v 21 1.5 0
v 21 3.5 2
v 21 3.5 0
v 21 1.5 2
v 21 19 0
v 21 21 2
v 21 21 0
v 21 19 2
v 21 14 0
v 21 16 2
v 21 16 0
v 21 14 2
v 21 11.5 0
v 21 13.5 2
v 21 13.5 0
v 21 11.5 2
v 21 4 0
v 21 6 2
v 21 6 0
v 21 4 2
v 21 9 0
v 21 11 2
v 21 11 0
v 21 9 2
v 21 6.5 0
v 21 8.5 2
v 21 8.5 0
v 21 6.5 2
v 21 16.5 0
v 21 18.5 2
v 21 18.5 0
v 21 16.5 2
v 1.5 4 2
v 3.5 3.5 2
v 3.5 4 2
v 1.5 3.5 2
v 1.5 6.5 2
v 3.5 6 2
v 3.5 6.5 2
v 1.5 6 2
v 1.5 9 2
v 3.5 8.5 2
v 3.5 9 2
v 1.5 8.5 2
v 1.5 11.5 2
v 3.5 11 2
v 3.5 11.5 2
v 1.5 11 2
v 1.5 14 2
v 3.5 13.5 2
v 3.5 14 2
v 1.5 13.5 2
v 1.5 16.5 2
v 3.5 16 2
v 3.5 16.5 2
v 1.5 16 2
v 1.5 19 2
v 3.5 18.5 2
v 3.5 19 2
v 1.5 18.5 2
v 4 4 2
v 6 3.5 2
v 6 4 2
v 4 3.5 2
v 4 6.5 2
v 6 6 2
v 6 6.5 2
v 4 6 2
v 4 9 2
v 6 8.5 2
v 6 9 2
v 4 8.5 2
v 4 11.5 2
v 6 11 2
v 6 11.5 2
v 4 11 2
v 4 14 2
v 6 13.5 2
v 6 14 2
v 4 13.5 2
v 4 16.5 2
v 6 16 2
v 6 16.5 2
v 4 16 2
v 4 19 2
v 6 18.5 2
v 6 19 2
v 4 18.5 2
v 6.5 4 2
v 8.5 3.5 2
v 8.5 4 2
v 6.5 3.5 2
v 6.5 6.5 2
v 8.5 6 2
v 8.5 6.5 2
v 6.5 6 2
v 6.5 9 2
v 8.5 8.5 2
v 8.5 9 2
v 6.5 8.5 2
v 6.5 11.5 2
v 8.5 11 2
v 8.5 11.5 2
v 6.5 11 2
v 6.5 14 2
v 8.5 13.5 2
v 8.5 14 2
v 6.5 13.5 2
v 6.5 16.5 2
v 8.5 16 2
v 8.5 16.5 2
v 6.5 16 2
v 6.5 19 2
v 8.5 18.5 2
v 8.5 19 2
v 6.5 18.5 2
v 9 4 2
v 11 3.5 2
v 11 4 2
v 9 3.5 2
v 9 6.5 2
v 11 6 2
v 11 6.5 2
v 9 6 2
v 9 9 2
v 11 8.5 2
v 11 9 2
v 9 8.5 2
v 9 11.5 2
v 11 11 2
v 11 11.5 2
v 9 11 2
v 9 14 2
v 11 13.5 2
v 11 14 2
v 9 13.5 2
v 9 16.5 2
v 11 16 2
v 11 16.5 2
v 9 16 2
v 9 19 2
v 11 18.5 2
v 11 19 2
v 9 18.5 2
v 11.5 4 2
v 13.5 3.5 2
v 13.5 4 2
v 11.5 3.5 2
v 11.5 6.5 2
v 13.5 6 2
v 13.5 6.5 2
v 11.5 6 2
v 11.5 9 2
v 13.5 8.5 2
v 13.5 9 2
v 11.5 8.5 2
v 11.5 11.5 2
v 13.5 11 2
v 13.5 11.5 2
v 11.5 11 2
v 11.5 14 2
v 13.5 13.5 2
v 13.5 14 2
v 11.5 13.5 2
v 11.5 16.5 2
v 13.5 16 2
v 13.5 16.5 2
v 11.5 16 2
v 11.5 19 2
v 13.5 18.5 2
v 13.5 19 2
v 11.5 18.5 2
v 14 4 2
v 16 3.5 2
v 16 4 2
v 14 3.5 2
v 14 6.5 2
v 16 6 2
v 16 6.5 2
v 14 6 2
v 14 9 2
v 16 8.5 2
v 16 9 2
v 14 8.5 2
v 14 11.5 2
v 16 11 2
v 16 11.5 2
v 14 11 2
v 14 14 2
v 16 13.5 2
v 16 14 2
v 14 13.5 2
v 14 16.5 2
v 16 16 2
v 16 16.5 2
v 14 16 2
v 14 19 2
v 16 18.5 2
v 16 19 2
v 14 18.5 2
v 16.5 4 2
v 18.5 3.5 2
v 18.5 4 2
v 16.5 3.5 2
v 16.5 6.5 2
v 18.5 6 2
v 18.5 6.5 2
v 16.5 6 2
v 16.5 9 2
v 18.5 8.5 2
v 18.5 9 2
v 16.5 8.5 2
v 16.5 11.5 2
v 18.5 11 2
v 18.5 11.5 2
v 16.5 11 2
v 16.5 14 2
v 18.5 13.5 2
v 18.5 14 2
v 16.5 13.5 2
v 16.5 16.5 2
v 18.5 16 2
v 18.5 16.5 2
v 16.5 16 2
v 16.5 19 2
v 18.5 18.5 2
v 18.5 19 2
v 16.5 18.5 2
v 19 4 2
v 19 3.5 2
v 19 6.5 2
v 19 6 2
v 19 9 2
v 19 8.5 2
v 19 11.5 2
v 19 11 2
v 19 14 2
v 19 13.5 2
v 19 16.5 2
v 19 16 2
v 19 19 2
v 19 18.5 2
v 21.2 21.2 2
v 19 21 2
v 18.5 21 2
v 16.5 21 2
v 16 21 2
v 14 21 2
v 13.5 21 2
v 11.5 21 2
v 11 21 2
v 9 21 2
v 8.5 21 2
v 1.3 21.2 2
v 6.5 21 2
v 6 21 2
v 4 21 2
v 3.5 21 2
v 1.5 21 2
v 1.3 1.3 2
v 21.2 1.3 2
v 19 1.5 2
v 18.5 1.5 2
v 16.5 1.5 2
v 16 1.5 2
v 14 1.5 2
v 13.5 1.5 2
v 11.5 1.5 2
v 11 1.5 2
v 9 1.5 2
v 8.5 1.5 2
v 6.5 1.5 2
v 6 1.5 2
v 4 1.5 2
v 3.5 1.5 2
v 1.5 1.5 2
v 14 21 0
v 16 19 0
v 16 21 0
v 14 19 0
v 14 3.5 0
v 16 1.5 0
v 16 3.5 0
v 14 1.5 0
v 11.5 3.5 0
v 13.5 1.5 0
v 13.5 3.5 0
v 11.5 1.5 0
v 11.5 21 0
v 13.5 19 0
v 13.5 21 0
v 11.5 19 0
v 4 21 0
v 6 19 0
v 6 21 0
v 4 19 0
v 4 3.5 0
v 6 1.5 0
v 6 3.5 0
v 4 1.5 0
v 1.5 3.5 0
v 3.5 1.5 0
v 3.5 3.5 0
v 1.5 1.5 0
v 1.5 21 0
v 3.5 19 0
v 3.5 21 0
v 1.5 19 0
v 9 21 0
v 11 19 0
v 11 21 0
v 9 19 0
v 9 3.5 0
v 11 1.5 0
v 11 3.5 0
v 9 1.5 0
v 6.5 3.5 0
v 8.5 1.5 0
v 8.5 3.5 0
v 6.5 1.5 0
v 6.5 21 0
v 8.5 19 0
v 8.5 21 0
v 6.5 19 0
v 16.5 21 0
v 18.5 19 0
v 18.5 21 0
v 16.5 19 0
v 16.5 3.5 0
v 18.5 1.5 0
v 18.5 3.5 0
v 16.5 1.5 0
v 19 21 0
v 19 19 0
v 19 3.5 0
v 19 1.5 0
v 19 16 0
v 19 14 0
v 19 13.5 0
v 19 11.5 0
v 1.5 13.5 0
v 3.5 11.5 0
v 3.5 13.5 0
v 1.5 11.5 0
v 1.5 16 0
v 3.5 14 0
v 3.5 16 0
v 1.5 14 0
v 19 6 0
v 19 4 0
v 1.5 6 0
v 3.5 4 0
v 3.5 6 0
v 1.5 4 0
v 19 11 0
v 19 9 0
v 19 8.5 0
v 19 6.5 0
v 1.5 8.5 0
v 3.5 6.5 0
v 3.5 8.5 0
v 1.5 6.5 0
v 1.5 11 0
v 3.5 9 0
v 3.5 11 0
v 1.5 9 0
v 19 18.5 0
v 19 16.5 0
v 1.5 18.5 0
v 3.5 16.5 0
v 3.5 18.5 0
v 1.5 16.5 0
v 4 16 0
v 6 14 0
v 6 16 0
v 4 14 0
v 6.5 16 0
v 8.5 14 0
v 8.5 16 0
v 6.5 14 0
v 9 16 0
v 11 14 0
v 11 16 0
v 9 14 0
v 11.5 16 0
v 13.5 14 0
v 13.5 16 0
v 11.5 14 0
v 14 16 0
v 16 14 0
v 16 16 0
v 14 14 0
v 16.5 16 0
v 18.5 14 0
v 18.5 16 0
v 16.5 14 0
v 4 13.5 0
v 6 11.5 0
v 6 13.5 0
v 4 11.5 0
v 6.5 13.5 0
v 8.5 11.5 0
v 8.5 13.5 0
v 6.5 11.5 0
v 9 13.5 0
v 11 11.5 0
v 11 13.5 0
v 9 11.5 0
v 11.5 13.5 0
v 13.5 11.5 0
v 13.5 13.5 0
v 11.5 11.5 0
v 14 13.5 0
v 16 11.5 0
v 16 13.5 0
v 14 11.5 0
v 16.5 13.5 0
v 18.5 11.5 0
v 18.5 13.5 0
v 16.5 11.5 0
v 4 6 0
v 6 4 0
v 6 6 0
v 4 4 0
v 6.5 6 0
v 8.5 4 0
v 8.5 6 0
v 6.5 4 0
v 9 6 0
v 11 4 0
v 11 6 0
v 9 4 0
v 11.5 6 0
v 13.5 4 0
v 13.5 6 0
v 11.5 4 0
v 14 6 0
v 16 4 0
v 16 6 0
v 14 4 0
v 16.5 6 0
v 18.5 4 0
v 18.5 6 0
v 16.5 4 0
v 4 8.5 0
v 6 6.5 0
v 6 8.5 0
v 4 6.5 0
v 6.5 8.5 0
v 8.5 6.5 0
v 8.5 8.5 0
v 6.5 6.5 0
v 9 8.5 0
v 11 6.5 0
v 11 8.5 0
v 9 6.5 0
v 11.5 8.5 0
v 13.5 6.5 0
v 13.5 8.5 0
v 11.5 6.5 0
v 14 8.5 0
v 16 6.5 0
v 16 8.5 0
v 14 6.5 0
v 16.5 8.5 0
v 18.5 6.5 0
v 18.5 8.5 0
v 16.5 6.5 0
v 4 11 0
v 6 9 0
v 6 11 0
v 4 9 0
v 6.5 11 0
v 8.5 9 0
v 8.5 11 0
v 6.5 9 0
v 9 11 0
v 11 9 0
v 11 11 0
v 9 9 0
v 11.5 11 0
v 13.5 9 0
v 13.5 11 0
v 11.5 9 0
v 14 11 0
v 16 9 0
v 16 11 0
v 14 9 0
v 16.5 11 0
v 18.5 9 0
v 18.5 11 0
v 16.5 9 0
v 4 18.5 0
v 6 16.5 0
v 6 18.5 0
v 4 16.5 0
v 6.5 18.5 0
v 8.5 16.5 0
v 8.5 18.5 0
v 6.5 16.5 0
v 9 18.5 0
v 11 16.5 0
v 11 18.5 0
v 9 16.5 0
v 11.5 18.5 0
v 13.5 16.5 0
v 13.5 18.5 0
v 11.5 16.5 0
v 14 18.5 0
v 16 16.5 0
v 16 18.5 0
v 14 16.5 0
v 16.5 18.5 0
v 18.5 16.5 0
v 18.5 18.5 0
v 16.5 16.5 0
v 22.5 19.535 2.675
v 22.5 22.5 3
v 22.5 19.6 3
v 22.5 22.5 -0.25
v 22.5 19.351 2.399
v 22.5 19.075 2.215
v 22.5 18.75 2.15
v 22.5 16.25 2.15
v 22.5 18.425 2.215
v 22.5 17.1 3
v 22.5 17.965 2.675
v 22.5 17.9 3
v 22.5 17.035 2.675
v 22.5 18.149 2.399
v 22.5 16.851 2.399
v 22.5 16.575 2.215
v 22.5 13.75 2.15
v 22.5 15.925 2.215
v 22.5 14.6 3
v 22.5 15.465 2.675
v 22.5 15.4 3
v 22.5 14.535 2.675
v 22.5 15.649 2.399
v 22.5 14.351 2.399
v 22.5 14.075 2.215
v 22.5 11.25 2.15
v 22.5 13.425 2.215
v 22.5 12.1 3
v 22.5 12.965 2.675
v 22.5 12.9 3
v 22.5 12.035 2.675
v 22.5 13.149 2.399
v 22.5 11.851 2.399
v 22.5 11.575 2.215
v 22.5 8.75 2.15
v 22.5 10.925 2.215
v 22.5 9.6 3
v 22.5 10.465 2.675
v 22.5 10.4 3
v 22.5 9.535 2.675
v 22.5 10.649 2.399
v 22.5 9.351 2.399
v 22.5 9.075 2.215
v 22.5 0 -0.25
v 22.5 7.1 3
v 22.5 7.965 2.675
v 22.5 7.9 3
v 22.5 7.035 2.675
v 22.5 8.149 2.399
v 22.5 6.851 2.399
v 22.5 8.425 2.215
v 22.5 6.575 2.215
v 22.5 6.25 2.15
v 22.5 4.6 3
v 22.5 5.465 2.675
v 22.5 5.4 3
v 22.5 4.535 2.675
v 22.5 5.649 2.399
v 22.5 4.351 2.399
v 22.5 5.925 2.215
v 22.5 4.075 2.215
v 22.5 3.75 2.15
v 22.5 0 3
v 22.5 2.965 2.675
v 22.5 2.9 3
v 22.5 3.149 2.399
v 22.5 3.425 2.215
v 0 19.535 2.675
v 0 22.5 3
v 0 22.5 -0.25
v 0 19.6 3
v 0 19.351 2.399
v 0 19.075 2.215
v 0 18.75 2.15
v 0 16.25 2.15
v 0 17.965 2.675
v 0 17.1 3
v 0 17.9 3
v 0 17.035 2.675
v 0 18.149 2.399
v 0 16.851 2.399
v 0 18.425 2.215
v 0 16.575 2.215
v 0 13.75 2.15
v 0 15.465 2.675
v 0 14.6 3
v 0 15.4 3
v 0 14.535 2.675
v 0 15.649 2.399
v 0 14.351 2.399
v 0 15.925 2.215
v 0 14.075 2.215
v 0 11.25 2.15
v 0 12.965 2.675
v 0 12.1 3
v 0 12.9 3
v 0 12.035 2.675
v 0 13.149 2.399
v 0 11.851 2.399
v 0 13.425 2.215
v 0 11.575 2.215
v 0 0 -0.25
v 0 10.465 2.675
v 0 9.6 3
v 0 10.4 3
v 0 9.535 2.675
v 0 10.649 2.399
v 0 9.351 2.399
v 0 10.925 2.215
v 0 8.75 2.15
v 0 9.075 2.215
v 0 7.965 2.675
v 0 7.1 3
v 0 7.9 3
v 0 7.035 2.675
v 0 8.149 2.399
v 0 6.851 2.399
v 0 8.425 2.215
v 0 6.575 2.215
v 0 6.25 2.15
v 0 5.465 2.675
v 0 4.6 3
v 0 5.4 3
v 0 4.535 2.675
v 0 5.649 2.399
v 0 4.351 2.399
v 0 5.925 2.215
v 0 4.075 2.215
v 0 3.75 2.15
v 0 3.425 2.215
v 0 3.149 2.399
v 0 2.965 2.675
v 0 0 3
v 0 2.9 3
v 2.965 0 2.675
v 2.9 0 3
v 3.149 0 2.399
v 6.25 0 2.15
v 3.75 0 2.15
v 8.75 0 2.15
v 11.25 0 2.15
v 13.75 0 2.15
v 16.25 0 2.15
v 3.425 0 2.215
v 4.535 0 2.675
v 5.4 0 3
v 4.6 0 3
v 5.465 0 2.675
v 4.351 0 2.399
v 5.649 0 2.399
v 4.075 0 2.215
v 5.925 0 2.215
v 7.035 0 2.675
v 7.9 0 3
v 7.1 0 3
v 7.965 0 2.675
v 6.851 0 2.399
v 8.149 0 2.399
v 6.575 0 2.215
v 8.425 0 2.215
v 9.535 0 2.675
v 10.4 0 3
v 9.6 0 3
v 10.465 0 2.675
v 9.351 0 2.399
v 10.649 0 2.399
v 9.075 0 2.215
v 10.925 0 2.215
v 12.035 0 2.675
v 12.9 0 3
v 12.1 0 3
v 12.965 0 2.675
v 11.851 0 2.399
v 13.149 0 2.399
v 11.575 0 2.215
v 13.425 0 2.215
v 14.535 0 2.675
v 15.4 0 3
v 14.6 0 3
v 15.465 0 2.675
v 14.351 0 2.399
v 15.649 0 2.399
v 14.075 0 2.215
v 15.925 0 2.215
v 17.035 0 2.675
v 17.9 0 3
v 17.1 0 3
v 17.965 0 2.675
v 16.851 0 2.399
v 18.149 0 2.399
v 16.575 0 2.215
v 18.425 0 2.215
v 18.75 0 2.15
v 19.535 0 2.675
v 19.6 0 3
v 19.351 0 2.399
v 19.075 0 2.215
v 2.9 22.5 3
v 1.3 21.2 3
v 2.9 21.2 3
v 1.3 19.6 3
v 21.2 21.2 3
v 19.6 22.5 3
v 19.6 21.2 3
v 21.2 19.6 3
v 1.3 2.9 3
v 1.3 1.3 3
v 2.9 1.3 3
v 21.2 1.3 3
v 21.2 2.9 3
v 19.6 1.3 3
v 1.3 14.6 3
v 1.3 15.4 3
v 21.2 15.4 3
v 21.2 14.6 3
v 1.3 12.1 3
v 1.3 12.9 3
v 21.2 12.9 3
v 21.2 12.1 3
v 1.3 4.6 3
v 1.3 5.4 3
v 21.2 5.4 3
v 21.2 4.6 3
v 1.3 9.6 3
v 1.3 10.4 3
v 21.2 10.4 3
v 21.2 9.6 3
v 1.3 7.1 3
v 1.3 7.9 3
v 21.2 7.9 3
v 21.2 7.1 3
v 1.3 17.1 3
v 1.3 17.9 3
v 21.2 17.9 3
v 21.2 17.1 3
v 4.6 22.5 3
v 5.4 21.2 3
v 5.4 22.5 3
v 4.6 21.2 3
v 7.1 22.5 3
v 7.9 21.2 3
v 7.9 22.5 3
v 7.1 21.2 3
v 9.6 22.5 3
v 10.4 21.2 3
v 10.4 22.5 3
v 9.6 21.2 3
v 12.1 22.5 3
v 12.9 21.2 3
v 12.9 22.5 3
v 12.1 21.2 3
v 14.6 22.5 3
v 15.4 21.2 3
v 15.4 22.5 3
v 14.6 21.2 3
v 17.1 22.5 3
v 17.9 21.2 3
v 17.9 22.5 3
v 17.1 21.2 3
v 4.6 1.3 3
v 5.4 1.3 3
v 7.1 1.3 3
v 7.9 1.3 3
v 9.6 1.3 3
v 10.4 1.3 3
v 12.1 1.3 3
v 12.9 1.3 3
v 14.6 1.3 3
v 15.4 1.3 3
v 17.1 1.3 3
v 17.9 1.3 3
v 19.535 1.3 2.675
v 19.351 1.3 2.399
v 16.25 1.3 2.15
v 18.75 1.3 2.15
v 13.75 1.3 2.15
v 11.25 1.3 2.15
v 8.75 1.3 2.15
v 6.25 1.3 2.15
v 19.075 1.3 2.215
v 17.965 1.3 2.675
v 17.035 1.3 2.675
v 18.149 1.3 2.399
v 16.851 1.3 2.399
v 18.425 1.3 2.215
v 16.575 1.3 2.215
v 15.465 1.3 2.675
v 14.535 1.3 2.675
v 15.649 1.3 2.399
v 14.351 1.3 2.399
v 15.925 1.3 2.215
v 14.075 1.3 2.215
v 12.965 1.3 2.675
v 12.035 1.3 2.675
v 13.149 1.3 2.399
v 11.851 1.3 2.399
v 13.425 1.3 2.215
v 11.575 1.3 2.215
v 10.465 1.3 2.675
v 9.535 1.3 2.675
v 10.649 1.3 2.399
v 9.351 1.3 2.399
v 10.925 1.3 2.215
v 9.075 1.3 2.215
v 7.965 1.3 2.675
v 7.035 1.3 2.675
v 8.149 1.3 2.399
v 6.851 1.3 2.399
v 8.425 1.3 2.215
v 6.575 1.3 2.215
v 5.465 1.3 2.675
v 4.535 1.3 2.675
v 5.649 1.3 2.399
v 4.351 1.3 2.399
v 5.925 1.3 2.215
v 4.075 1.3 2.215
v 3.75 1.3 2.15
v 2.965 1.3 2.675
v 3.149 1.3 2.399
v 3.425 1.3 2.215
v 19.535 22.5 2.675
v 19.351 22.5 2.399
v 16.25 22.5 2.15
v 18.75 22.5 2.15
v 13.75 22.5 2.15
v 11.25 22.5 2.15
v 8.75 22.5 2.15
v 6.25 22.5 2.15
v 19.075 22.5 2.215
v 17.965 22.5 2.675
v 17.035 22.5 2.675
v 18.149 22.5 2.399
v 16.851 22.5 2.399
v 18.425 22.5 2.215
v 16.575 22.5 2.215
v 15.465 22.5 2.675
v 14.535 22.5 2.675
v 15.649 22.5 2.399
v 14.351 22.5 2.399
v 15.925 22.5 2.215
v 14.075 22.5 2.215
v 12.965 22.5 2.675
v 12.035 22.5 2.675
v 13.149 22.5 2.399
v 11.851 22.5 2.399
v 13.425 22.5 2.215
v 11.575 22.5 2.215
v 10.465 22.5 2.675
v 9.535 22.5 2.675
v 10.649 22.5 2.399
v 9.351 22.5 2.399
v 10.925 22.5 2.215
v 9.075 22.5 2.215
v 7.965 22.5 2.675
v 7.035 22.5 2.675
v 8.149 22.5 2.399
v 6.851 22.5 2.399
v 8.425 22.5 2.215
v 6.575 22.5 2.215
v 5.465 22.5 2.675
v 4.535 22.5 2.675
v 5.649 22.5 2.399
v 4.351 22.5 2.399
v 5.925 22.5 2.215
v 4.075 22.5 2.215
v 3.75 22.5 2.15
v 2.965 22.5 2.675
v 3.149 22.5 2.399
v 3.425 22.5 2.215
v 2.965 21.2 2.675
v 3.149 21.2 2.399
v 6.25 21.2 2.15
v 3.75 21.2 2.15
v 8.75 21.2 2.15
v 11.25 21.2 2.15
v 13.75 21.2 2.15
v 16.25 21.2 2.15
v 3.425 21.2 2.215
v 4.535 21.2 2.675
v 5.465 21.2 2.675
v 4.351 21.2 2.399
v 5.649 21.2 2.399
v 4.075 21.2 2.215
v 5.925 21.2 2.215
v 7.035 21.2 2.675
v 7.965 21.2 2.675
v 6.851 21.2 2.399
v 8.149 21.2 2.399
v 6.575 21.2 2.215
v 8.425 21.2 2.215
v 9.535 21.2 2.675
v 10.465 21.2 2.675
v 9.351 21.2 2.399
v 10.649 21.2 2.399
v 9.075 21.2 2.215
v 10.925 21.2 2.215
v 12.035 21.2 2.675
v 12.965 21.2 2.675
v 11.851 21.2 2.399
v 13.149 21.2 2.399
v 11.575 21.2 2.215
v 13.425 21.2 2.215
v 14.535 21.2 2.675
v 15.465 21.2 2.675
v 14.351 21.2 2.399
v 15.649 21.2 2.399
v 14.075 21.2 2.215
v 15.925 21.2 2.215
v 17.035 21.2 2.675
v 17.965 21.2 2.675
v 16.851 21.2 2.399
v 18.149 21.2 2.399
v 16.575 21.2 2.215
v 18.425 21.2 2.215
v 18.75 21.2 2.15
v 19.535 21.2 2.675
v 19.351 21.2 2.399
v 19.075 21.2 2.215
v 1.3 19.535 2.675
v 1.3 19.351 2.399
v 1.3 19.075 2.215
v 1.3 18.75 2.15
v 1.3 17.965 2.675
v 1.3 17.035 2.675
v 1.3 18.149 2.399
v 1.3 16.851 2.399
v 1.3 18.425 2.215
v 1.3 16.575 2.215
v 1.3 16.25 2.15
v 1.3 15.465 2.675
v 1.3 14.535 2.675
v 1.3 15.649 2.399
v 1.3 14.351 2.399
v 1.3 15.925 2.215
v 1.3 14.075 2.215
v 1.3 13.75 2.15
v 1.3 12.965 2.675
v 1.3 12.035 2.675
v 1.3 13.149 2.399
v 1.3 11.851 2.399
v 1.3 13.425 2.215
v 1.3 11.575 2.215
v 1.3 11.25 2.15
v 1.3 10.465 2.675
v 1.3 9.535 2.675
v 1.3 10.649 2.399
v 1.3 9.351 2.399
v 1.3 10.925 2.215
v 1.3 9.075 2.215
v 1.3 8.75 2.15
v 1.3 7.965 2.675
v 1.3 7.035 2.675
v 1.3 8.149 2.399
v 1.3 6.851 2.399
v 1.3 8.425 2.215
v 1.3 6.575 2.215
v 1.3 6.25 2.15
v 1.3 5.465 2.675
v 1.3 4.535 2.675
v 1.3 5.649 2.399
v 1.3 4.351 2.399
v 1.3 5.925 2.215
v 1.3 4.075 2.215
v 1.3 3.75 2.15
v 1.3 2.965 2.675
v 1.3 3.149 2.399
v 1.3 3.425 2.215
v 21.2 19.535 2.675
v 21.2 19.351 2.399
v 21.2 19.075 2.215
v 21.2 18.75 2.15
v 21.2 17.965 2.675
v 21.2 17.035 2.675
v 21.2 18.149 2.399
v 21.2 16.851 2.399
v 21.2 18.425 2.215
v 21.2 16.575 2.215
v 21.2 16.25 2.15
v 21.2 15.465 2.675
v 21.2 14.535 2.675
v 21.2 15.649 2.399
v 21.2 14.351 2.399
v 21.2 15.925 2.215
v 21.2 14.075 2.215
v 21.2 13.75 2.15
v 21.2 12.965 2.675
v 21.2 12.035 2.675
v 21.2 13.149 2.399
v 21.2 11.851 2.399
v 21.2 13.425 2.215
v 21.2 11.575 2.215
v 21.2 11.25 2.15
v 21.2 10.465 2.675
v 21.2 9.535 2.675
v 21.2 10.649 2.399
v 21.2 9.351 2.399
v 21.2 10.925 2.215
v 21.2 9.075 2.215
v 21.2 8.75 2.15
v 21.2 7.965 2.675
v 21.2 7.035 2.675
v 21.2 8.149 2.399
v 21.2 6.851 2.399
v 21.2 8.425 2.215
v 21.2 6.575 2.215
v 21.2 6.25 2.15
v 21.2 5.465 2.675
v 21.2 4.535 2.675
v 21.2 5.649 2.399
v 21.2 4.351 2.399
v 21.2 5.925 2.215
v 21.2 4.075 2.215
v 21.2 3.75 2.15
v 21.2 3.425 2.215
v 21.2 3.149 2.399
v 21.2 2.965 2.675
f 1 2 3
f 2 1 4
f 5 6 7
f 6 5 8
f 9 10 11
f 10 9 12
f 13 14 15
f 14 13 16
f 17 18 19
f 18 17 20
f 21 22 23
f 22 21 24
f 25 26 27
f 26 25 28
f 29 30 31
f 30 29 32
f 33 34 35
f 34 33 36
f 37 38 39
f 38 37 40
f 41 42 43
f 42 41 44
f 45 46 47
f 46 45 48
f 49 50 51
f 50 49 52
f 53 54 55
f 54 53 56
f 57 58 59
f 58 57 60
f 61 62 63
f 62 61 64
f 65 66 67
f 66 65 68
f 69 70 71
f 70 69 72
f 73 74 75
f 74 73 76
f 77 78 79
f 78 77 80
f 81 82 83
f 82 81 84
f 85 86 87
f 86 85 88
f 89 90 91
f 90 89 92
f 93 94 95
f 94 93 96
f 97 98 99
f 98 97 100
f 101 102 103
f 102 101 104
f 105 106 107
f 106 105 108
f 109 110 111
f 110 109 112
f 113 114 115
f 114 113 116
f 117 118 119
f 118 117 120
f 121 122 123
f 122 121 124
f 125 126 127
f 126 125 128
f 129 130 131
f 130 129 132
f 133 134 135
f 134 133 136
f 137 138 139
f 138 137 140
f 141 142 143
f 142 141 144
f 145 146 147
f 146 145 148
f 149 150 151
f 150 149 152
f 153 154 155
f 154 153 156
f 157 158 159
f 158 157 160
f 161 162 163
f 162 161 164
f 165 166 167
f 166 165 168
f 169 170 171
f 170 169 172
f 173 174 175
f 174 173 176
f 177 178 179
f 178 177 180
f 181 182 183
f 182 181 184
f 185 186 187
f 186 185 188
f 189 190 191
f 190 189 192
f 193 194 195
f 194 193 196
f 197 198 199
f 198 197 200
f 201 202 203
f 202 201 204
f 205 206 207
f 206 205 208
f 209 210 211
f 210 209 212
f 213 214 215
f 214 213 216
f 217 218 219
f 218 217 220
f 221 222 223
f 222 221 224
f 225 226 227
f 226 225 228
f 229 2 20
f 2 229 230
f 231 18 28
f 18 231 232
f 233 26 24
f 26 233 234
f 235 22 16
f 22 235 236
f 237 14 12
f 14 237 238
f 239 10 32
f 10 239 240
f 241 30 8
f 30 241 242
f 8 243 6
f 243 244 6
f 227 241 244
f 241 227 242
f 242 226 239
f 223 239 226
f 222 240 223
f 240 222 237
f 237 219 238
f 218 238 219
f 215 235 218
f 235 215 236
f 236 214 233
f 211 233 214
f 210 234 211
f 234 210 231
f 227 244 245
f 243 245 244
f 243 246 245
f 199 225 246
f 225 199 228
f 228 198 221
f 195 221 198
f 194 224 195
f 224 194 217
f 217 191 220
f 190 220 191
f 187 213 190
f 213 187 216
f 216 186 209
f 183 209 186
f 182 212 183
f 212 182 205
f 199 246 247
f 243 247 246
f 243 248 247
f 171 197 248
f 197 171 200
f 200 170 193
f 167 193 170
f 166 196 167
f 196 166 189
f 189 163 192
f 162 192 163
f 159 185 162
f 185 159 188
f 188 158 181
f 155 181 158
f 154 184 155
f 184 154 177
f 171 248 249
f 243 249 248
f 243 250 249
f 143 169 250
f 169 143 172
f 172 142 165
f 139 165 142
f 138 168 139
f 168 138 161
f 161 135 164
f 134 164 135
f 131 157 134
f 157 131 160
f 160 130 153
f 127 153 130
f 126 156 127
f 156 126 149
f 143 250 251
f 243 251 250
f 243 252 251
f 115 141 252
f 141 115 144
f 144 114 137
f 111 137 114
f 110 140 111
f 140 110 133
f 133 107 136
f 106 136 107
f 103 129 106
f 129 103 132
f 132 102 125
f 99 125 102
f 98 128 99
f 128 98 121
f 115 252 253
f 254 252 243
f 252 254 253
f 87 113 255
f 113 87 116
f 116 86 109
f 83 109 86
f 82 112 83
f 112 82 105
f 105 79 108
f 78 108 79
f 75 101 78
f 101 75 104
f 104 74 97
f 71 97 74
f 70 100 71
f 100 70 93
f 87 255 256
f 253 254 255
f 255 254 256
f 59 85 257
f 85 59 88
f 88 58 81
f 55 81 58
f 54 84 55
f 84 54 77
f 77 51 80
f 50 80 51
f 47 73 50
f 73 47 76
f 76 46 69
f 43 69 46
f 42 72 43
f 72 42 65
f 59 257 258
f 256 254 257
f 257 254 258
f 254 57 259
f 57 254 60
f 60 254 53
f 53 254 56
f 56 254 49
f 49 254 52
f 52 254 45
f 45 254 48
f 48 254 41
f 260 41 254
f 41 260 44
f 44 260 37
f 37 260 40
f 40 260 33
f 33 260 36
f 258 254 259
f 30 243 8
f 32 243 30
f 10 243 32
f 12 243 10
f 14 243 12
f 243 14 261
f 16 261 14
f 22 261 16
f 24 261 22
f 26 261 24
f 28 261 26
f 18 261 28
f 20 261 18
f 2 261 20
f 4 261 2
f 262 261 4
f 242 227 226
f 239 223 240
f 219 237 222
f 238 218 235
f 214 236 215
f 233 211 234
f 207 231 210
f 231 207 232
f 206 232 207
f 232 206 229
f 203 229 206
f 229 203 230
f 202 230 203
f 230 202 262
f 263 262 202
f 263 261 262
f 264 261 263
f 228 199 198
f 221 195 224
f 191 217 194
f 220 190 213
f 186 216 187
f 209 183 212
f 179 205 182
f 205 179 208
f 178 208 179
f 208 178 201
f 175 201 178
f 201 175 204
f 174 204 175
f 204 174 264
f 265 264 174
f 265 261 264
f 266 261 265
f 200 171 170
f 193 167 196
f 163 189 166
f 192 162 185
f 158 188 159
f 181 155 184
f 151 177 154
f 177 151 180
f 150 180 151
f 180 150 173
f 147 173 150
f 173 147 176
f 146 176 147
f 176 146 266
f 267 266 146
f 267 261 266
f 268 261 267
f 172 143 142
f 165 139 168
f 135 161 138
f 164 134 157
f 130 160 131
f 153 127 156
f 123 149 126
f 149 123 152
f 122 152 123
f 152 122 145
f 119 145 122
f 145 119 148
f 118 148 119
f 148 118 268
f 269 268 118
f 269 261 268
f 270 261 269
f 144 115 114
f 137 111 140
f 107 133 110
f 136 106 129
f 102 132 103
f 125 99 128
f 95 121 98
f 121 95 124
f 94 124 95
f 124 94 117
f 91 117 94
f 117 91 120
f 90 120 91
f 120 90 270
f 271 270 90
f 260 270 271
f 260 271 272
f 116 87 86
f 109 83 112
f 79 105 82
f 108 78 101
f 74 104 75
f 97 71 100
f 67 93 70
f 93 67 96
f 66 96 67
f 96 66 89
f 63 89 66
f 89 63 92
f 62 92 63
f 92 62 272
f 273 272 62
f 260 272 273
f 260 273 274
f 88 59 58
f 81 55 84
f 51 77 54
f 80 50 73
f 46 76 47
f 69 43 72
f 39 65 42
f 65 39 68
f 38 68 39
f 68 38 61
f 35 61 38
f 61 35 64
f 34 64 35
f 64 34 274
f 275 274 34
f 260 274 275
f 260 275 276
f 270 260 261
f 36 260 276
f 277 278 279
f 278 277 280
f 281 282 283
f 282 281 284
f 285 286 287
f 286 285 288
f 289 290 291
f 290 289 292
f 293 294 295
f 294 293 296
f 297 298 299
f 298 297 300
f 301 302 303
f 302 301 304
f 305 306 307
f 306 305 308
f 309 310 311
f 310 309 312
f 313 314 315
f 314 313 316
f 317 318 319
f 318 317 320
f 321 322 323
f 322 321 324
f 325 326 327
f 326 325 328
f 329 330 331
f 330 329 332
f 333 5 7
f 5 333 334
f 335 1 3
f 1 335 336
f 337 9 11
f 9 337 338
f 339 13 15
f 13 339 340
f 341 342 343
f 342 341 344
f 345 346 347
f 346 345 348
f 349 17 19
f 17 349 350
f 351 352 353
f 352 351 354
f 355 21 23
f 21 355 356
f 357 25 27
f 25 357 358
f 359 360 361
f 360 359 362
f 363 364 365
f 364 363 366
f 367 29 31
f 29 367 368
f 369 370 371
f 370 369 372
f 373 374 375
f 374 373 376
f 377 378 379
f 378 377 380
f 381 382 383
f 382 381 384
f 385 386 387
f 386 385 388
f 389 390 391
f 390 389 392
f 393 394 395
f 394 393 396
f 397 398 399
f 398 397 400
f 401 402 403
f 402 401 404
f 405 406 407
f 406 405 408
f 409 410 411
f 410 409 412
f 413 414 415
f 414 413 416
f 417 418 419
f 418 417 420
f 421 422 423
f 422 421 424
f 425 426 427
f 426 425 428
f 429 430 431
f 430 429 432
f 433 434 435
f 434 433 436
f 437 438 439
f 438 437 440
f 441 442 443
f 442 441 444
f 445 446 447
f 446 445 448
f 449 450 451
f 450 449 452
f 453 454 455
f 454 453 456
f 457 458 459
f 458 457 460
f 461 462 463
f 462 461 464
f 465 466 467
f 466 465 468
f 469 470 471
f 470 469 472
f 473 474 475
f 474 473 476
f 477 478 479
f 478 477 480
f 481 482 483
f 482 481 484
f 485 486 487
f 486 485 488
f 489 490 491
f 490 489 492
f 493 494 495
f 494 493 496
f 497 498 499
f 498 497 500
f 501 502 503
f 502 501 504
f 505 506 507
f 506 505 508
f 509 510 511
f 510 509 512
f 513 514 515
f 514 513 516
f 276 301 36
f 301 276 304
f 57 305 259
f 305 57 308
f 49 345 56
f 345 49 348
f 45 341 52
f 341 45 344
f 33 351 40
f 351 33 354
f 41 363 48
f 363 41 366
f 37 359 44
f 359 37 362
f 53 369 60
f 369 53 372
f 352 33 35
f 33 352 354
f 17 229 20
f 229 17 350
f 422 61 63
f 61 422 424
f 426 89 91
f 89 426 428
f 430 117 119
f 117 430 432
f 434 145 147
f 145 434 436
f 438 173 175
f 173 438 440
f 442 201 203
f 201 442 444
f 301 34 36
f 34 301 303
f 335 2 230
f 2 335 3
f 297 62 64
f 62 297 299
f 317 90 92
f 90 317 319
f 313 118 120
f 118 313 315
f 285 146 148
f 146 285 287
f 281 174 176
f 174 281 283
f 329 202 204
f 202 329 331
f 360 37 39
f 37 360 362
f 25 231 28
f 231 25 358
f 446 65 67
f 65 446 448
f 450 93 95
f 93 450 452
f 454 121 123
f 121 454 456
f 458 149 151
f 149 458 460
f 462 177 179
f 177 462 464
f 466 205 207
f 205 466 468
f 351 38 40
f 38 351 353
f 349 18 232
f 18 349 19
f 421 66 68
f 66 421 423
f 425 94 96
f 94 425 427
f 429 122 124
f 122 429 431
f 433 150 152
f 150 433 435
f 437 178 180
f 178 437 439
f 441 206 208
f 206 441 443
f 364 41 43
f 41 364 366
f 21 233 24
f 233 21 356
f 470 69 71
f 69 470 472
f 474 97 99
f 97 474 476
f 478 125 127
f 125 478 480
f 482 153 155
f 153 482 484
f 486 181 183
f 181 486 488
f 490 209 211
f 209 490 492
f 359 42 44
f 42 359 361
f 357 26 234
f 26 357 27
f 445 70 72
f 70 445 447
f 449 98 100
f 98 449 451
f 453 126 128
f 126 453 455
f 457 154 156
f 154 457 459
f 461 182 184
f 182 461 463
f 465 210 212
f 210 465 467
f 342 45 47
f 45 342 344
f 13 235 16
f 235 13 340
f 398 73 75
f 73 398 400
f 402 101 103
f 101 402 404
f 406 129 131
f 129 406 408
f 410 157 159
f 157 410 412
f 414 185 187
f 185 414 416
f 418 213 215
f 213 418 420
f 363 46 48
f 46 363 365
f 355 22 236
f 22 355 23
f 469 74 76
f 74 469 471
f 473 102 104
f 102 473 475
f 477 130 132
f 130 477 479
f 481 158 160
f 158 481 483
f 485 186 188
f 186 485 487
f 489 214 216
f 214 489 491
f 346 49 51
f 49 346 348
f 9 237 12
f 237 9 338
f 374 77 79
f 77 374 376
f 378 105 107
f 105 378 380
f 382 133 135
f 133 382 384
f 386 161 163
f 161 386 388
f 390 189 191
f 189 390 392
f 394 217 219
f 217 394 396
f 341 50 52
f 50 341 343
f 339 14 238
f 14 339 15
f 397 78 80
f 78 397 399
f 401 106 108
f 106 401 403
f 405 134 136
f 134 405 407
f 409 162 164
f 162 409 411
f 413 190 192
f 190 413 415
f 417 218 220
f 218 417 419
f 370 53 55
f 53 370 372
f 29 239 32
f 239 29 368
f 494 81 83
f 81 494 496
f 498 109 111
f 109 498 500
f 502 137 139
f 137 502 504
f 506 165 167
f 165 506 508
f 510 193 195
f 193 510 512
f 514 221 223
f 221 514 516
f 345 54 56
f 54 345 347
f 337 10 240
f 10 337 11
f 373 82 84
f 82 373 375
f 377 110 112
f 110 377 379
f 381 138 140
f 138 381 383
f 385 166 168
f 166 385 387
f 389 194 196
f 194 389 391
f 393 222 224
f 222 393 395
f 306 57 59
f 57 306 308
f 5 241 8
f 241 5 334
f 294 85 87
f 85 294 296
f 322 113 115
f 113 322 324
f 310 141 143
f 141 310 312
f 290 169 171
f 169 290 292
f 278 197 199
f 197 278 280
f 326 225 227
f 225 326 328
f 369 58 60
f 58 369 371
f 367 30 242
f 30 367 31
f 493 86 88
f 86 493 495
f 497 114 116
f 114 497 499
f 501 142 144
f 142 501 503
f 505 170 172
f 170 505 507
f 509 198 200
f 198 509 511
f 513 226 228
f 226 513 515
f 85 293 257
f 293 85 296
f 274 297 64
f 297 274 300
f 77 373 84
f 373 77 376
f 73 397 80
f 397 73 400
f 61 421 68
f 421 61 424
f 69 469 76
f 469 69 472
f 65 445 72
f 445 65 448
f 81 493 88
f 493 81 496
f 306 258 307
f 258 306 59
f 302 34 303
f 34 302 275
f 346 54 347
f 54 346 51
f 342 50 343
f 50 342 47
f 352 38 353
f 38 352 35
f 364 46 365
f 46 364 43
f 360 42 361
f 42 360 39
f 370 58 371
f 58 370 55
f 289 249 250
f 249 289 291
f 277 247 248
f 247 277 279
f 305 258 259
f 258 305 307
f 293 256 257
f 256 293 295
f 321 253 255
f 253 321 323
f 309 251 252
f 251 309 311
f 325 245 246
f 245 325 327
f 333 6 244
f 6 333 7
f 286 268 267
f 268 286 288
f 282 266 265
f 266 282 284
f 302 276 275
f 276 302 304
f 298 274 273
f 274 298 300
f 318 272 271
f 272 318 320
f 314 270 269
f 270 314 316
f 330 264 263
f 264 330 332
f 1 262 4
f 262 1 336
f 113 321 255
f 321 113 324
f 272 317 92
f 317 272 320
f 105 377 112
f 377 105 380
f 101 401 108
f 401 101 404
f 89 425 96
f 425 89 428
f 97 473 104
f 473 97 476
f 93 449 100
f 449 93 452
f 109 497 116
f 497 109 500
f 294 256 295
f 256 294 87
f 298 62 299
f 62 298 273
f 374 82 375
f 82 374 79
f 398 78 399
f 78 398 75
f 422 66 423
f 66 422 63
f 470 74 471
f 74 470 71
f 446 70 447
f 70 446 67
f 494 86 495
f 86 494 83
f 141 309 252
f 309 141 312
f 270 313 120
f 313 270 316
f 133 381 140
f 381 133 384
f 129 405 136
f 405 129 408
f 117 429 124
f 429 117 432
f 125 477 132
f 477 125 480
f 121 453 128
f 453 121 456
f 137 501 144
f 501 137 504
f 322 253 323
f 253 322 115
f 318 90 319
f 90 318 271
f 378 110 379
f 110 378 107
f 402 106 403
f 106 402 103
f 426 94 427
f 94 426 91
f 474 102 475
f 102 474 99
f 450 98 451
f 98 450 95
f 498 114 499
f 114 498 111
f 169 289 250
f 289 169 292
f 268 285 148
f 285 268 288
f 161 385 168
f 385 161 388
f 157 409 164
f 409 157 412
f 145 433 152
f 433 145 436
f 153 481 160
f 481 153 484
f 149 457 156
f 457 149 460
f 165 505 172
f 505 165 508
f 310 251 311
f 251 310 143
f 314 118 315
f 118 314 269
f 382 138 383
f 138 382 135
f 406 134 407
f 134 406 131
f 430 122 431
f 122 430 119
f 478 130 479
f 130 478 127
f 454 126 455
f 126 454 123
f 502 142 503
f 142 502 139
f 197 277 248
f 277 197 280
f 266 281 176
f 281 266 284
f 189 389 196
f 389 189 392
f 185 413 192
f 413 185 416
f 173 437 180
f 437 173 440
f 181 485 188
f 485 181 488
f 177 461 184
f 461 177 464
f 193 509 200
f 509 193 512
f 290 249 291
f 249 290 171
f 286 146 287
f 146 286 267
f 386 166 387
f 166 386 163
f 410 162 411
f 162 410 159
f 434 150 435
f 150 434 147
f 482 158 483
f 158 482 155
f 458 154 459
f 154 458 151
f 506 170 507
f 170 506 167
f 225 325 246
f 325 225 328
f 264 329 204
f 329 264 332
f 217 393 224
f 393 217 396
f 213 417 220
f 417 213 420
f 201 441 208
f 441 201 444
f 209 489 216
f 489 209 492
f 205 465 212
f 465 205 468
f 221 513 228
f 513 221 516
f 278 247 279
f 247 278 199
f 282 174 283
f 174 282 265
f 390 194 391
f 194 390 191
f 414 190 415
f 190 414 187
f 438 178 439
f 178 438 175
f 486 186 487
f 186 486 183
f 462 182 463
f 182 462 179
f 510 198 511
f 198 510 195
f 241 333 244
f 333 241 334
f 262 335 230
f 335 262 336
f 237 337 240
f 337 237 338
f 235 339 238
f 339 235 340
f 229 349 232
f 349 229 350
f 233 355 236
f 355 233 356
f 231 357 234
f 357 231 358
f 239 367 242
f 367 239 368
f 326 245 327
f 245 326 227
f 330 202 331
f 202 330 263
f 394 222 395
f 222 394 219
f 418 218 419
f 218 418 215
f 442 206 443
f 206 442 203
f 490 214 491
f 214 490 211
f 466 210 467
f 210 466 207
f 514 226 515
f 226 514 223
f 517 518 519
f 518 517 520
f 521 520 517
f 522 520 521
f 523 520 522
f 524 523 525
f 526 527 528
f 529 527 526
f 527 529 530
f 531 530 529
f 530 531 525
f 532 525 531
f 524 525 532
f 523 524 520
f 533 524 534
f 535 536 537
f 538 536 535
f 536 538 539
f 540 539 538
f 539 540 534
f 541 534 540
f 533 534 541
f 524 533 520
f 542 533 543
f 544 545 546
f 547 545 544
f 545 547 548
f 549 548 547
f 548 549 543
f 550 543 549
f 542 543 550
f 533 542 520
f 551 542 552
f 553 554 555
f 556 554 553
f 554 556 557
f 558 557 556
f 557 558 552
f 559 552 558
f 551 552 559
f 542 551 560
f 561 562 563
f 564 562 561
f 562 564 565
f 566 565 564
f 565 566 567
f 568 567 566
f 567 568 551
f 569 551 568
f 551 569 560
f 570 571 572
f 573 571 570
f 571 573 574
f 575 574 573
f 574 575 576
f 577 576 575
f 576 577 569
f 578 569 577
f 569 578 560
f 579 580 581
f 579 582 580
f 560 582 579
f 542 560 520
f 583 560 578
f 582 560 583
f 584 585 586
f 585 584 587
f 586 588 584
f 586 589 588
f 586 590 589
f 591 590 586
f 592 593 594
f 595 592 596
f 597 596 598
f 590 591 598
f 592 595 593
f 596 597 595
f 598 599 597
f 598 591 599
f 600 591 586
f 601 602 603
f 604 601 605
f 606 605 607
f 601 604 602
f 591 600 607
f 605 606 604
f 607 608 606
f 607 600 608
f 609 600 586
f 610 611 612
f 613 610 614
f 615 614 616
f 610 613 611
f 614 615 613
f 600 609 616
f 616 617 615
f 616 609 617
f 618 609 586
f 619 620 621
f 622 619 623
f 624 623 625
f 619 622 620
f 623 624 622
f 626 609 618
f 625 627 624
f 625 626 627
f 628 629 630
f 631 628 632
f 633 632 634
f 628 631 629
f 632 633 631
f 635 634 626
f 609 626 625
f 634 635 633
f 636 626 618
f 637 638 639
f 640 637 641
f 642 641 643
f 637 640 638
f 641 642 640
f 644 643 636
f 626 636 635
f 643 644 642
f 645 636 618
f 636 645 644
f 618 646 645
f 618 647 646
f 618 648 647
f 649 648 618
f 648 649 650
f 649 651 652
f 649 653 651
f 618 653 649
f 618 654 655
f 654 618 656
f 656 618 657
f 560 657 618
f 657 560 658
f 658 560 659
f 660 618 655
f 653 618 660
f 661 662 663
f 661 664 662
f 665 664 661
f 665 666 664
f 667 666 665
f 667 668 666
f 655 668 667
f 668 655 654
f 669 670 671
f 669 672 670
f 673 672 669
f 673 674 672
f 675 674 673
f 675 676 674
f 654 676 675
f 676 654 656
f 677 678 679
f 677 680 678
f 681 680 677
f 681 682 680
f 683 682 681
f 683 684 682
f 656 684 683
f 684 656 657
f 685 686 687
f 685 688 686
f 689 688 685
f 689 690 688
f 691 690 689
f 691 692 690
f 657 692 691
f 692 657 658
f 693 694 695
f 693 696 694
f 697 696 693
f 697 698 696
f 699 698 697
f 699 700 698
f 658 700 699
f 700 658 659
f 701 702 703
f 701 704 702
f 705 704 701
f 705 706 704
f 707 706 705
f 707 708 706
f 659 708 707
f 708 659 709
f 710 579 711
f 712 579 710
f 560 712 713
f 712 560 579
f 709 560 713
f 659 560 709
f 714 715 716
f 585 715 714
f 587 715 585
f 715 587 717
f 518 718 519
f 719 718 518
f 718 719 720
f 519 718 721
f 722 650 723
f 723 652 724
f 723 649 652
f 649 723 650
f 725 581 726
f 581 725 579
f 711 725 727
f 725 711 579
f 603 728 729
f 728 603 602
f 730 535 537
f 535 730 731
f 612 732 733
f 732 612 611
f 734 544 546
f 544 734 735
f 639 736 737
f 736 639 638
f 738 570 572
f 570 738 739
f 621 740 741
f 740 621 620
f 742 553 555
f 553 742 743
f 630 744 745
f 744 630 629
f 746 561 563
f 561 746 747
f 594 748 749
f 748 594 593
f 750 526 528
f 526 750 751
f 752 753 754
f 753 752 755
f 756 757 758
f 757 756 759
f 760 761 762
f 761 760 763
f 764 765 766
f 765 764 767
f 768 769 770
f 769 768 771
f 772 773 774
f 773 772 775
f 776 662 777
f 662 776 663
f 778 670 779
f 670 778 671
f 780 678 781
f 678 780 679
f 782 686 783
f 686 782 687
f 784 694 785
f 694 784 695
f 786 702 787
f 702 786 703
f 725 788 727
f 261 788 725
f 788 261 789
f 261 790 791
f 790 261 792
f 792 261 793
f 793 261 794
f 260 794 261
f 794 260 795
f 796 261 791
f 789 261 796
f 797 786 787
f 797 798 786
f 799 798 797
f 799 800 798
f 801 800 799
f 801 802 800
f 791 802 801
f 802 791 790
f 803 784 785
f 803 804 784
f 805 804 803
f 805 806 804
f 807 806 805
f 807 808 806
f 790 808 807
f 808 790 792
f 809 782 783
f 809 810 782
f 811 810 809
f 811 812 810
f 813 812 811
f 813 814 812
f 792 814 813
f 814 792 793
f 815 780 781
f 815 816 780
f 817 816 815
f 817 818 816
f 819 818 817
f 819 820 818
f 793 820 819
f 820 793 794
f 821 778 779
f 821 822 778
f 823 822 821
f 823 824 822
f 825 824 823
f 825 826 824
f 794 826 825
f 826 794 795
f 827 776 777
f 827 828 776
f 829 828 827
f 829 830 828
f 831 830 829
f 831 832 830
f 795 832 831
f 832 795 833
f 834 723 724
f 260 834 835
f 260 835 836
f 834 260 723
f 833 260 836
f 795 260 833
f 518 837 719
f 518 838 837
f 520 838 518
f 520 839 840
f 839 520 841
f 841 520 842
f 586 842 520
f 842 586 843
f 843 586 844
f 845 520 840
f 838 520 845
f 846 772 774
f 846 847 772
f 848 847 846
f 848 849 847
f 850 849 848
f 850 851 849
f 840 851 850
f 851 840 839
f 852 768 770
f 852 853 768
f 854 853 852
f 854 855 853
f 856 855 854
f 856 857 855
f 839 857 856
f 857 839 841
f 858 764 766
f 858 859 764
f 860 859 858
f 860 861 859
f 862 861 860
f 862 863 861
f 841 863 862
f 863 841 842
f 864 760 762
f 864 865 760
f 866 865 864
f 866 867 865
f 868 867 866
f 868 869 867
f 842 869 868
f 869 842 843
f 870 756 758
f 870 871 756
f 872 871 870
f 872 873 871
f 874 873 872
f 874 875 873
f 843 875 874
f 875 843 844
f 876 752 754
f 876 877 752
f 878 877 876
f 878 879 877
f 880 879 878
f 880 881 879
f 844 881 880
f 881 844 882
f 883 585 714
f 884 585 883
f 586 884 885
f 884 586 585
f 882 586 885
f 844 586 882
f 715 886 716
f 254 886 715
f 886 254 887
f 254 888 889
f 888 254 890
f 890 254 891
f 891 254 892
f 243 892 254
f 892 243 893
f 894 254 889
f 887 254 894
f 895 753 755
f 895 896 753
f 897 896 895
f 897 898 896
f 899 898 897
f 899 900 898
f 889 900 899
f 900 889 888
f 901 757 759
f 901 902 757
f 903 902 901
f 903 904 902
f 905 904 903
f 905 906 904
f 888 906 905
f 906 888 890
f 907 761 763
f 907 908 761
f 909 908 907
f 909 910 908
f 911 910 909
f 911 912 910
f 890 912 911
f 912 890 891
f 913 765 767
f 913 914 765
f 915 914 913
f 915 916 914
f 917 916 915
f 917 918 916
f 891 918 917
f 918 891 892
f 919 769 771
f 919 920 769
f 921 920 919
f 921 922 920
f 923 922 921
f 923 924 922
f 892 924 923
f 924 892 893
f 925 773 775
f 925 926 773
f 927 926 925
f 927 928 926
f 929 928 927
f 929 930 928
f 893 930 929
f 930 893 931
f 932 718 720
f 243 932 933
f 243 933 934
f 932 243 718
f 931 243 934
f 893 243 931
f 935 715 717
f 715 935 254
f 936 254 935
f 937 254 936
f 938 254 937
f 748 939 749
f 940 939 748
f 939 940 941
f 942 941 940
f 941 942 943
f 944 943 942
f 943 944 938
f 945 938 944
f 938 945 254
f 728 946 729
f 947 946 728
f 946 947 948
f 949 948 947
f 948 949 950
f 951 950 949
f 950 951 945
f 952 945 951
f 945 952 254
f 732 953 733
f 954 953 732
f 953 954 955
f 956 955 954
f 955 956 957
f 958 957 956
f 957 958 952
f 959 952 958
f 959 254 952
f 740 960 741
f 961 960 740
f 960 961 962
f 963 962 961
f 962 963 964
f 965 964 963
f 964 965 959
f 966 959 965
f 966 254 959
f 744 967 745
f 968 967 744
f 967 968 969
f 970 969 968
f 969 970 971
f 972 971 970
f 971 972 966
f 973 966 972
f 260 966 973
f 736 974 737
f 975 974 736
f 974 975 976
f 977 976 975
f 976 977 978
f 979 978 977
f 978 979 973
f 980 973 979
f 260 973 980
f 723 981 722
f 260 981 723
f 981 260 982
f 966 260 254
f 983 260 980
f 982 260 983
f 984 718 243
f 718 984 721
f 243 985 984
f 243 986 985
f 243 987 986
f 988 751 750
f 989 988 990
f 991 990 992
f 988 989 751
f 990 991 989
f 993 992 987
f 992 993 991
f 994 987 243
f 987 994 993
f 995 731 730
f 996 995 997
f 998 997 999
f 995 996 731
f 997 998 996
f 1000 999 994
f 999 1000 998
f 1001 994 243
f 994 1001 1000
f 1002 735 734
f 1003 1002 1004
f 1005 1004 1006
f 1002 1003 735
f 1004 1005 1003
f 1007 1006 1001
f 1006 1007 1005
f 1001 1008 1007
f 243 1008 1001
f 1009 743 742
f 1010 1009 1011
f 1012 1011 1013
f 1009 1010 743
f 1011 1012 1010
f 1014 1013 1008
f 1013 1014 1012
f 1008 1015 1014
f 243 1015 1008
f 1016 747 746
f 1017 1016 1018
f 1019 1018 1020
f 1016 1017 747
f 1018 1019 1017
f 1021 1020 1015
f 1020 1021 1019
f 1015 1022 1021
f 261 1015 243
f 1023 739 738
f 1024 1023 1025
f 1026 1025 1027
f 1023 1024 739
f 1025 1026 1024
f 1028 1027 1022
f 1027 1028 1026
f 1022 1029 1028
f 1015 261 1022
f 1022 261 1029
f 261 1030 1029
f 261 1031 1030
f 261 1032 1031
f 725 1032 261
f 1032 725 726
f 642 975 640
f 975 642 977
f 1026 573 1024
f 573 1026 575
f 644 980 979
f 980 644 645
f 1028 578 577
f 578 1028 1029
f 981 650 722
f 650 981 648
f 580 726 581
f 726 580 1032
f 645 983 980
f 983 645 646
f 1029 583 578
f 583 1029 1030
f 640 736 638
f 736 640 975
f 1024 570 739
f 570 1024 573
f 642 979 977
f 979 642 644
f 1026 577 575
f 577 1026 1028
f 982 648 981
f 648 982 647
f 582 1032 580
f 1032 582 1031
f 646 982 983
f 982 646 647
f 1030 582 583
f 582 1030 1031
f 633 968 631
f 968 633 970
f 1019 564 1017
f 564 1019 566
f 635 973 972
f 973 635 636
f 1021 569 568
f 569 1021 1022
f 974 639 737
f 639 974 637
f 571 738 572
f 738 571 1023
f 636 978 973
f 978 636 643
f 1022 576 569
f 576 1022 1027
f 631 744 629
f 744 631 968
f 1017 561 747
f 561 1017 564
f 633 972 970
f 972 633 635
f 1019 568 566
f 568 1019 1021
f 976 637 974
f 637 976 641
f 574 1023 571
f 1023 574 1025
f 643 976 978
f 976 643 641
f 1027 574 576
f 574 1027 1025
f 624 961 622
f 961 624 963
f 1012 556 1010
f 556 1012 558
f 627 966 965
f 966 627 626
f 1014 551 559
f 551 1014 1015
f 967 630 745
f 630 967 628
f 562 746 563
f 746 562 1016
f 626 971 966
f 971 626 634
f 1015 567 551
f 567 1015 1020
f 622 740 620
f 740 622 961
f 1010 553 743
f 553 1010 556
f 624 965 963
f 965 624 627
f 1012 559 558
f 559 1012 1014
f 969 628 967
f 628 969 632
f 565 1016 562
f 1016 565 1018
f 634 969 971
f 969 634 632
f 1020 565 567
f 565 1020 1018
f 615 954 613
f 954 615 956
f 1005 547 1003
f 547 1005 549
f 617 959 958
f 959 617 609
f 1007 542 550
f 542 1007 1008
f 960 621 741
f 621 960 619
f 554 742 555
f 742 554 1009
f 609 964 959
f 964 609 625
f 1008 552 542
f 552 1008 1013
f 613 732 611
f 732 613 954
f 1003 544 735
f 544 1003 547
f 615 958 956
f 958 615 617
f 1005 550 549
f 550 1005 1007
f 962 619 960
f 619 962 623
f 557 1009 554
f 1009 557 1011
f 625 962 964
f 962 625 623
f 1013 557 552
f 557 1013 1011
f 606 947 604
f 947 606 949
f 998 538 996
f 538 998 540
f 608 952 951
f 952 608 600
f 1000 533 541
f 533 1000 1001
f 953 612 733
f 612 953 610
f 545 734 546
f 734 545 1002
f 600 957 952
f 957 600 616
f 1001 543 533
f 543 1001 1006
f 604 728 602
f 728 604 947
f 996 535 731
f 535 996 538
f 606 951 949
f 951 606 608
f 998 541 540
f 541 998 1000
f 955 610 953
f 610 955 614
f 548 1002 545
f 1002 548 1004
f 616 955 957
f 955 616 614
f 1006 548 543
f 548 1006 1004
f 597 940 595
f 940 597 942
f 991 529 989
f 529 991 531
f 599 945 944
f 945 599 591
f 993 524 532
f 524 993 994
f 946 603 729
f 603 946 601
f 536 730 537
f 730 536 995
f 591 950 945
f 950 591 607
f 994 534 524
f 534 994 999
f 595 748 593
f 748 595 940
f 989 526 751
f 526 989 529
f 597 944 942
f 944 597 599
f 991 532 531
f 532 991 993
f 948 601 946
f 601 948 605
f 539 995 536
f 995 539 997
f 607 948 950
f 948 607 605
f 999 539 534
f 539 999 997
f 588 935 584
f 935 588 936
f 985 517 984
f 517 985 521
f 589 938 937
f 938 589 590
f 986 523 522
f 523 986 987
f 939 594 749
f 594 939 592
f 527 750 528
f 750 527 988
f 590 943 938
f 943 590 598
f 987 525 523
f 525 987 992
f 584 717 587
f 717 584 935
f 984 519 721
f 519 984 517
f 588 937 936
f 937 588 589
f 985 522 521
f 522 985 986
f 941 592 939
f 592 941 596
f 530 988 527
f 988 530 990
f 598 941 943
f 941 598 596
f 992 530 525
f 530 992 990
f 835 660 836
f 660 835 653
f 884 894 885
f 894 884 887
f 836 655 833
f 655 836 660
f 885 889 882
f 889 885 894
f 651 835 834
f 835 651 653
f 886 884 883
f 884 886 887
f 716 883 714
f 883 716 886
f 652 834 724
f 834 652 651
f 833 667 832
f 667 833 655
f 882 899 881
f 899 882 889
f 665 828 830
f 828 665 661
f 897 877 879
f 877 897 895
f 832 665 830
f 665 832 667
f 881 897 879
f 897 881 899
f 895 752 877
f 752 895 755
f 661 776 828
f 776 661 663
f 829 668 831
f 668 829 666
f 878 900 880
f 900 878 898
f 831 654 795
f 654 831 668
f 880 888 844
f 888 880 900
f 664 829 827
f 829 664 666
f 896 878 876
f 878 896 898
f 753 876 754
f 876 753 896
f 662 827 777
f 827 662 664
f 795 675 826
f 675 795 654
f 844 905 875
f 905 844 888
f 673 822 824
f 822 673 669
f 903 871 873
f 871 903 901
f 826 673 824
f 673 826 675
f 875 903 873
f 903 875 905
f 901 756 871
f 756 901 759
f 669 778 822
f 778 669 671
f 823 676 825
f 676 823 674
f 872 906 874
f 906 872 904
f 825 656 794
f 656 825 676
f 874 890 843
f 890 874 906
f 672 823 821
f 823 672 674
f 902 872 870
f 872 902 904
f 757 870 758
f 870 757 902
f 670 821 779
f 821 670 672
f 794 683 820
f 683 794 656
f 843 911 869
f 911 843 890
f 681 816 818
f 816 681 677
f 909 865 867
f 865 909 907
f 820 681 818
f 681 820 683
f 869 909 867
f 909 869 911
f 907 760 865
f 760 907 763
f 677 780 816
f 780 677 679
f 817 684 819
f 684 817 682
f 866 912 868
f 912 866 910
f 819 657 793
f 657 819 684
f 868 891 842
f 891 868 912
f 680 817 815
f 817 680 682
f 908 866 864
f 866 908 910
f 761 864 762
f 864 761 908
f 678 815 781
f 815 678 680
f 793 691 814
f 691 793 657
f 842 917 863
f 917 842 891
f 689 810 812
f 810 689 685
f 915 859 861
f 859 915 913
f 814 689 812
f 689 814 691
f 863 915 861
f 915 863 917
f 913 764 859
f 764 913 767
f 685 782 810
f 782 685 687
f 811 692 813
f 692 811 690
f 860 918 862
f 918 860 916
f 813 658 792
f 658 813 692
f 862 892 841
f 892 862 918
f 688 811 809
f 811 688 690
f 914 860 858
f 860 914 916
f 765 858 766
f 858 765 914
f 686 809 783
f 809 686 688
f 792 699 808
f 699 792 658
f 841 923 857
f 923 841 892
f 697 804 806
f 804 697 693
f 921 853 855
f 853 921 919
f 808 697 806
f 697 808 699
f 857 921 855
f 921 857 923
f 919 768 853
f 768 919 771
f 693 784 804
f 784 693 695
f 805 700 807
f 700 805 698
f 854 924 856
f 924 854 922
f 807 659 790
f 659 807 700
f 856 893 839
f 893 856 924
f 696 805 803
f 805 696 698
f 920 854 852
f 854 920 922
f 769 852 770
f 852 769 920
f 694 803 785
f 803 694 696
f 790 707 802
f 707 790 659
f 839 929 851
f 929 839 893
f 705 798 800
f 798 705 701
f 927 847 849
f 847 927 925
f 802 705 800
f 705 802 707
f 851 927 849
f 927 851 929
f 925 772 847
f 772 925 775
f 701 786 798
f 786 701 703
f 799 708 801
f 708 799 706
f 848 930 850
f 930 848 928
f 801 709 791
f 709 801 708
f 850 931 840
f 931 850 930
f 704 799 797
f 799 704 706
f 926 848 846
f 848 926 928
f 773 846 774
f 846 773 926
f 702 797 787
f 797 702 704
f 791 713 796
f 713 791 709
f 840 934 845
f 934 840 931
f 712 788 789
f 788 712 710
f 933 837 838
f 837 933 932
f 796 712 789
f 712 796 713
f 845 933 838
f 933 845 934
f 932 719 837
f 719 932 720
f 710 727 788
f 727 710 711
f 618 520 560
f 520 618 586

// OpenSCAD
grid_size_x = 8; // number of pixels on x
grid_size_y = 8; // number of pixels on y

cell_size = 2.5; // pitch between pixels
inner_wall_thickness = 0.5; // I think you get this one
outer_wall_thickness = 1.5; //this one too
inner_wall_height = 2; // minimum TBD by experimentation
outer_wall_height = inner_wall_height + 1;
pcb_tolerance = 0.2; //wiggle room for pcb

hole_size = 0.85; // size for solder joint holes

module grid() { // make readable code they said... 
  
    translate([0, 0, 0])
            cube([grid_size_y * cell_size - inner_wall_thickness + 2 * outer_wall_thickness, outer_wall_thickness, inner_wall_height]);
    translate([0, 0, inner_wall_height])
            cube([grid_size_y * cell_size - inner_wall_thickness + 2 * outer_wall_thickness, outer_wall_thickness - pcb_tolerance, outer_wall_height - inner_wall_height]);
    
    for (y = [1 : 1 : grid_size_x -1]) {
        translate([outer_wall_thickness, y * cell_size + outer_wall_thickness - inner_wall_thickness, 0])
            cube([grid_size_y * cell_size - inner_wall_thickness, inner_wall_thickness, inner_wall_height]);
    }
    
    translate([0, grid_size_x * cell_size + outer_wall_thickness - inner_wall_thickness, 0])
            cube([grid_size_y * cell_size - inner_wall_thickness + 2 * outer_wall_thickness, outer_wall_thickness, inner_wall_height]);
    translate([0, grid_size_x * cell_size + outer_wall_thickness - inner_wall_thickness + pcb_tolerance, inner_wall_height])
           cube([grid_size_y * cell_size - inner_wall_thickness + 2 * outer_wall_thickness, outer_wall_thickness - pcb_tolerance, outer_wall_height - inner_wall_height]);
    
    
    translate([0, 0, 0])
            cube([outer_wall_thickness, grid_size_x * cell_size - inner_wall_thickness + 2 * outer_wall_thickness, inner_wall_height]); 
    translate([0, 0, inner_wall_height])
            cube([outer_wall_thickness - pcb_tolerance, grid_size_x * cell_size - inner_wall_thickness + 2 * outer_wall_thickness, outer_wall_height - inner_wall_height]);
    
    for (x = [1 : 1 : grid_size_y - 1]) {
        translate([x * cell_size + outer_wall_thickness -inner_wall_thickness, outer_wall_thickness, 0])
            cube([inner_wall_thickness, grid_size_x * cell_size - inner_wall_thickness, inner_wall_height]);
    }
    
    translate([grid_size_y * cell_size + outer_wall_thickness - inner_wall_thickness, 0, 0])
            cube([outer_wall_thickness, grid_size_x * cell_size - inner_wall_thickness + 2 * outer_wall_thickness, inner_wall_height]);
    translate([grid_size_y * cell_size + outer_wall_thickness - inner_wall_thickness + pcb_tolerance, 0, inner_wall_height])
            cube([outer_wall_thickness - pcb_tolerance, grid_size_x * cell_size - inner_wall_thickness + 2 * outer_wall_thickness, outer_wall_height - inner_wall_height]);
}

diffusion_thickness = 0.25; //diffusion layer thickness, set to first layer height for your nozzle

translate([0,0,-diffusion_thickness])
color("white") cube([grid_size_x*cell_size+outer_wall_thickness*2 - inner_wall_thickness,grid_size_y*cell_size+outer_wall_thickness*2 - inner_wall_thickness,diffusion_thickness]); //white diffusion layer, 
 
 color([0.9,0.8,1]) difference() { //holes for soldering the module on a different pcb
     grid();
     for (y = [1 : 1 : grid_size_x -1]) {
        translate([-0.1, y * cell_size + outer_wall_thickness - inner_wall_thickness/2, outer_wall_height])
        rotate([0,90,0])
        cylinder(r=hole_size, h=cell_size * (grid_size_y + 2), $fn=16);
    }
    for (y = [1 : 1 : grid_size_y -1]) {
        translate([y * cell_size + outer_wall_thickness - inner_wall_thickness/2, -0.1, outer_wall_height])
        rotate([0,90,90])
        cylinder(r=hole_size, h=cell_size * (grid_size_y + 2), $fn=16);
    }
     
}
